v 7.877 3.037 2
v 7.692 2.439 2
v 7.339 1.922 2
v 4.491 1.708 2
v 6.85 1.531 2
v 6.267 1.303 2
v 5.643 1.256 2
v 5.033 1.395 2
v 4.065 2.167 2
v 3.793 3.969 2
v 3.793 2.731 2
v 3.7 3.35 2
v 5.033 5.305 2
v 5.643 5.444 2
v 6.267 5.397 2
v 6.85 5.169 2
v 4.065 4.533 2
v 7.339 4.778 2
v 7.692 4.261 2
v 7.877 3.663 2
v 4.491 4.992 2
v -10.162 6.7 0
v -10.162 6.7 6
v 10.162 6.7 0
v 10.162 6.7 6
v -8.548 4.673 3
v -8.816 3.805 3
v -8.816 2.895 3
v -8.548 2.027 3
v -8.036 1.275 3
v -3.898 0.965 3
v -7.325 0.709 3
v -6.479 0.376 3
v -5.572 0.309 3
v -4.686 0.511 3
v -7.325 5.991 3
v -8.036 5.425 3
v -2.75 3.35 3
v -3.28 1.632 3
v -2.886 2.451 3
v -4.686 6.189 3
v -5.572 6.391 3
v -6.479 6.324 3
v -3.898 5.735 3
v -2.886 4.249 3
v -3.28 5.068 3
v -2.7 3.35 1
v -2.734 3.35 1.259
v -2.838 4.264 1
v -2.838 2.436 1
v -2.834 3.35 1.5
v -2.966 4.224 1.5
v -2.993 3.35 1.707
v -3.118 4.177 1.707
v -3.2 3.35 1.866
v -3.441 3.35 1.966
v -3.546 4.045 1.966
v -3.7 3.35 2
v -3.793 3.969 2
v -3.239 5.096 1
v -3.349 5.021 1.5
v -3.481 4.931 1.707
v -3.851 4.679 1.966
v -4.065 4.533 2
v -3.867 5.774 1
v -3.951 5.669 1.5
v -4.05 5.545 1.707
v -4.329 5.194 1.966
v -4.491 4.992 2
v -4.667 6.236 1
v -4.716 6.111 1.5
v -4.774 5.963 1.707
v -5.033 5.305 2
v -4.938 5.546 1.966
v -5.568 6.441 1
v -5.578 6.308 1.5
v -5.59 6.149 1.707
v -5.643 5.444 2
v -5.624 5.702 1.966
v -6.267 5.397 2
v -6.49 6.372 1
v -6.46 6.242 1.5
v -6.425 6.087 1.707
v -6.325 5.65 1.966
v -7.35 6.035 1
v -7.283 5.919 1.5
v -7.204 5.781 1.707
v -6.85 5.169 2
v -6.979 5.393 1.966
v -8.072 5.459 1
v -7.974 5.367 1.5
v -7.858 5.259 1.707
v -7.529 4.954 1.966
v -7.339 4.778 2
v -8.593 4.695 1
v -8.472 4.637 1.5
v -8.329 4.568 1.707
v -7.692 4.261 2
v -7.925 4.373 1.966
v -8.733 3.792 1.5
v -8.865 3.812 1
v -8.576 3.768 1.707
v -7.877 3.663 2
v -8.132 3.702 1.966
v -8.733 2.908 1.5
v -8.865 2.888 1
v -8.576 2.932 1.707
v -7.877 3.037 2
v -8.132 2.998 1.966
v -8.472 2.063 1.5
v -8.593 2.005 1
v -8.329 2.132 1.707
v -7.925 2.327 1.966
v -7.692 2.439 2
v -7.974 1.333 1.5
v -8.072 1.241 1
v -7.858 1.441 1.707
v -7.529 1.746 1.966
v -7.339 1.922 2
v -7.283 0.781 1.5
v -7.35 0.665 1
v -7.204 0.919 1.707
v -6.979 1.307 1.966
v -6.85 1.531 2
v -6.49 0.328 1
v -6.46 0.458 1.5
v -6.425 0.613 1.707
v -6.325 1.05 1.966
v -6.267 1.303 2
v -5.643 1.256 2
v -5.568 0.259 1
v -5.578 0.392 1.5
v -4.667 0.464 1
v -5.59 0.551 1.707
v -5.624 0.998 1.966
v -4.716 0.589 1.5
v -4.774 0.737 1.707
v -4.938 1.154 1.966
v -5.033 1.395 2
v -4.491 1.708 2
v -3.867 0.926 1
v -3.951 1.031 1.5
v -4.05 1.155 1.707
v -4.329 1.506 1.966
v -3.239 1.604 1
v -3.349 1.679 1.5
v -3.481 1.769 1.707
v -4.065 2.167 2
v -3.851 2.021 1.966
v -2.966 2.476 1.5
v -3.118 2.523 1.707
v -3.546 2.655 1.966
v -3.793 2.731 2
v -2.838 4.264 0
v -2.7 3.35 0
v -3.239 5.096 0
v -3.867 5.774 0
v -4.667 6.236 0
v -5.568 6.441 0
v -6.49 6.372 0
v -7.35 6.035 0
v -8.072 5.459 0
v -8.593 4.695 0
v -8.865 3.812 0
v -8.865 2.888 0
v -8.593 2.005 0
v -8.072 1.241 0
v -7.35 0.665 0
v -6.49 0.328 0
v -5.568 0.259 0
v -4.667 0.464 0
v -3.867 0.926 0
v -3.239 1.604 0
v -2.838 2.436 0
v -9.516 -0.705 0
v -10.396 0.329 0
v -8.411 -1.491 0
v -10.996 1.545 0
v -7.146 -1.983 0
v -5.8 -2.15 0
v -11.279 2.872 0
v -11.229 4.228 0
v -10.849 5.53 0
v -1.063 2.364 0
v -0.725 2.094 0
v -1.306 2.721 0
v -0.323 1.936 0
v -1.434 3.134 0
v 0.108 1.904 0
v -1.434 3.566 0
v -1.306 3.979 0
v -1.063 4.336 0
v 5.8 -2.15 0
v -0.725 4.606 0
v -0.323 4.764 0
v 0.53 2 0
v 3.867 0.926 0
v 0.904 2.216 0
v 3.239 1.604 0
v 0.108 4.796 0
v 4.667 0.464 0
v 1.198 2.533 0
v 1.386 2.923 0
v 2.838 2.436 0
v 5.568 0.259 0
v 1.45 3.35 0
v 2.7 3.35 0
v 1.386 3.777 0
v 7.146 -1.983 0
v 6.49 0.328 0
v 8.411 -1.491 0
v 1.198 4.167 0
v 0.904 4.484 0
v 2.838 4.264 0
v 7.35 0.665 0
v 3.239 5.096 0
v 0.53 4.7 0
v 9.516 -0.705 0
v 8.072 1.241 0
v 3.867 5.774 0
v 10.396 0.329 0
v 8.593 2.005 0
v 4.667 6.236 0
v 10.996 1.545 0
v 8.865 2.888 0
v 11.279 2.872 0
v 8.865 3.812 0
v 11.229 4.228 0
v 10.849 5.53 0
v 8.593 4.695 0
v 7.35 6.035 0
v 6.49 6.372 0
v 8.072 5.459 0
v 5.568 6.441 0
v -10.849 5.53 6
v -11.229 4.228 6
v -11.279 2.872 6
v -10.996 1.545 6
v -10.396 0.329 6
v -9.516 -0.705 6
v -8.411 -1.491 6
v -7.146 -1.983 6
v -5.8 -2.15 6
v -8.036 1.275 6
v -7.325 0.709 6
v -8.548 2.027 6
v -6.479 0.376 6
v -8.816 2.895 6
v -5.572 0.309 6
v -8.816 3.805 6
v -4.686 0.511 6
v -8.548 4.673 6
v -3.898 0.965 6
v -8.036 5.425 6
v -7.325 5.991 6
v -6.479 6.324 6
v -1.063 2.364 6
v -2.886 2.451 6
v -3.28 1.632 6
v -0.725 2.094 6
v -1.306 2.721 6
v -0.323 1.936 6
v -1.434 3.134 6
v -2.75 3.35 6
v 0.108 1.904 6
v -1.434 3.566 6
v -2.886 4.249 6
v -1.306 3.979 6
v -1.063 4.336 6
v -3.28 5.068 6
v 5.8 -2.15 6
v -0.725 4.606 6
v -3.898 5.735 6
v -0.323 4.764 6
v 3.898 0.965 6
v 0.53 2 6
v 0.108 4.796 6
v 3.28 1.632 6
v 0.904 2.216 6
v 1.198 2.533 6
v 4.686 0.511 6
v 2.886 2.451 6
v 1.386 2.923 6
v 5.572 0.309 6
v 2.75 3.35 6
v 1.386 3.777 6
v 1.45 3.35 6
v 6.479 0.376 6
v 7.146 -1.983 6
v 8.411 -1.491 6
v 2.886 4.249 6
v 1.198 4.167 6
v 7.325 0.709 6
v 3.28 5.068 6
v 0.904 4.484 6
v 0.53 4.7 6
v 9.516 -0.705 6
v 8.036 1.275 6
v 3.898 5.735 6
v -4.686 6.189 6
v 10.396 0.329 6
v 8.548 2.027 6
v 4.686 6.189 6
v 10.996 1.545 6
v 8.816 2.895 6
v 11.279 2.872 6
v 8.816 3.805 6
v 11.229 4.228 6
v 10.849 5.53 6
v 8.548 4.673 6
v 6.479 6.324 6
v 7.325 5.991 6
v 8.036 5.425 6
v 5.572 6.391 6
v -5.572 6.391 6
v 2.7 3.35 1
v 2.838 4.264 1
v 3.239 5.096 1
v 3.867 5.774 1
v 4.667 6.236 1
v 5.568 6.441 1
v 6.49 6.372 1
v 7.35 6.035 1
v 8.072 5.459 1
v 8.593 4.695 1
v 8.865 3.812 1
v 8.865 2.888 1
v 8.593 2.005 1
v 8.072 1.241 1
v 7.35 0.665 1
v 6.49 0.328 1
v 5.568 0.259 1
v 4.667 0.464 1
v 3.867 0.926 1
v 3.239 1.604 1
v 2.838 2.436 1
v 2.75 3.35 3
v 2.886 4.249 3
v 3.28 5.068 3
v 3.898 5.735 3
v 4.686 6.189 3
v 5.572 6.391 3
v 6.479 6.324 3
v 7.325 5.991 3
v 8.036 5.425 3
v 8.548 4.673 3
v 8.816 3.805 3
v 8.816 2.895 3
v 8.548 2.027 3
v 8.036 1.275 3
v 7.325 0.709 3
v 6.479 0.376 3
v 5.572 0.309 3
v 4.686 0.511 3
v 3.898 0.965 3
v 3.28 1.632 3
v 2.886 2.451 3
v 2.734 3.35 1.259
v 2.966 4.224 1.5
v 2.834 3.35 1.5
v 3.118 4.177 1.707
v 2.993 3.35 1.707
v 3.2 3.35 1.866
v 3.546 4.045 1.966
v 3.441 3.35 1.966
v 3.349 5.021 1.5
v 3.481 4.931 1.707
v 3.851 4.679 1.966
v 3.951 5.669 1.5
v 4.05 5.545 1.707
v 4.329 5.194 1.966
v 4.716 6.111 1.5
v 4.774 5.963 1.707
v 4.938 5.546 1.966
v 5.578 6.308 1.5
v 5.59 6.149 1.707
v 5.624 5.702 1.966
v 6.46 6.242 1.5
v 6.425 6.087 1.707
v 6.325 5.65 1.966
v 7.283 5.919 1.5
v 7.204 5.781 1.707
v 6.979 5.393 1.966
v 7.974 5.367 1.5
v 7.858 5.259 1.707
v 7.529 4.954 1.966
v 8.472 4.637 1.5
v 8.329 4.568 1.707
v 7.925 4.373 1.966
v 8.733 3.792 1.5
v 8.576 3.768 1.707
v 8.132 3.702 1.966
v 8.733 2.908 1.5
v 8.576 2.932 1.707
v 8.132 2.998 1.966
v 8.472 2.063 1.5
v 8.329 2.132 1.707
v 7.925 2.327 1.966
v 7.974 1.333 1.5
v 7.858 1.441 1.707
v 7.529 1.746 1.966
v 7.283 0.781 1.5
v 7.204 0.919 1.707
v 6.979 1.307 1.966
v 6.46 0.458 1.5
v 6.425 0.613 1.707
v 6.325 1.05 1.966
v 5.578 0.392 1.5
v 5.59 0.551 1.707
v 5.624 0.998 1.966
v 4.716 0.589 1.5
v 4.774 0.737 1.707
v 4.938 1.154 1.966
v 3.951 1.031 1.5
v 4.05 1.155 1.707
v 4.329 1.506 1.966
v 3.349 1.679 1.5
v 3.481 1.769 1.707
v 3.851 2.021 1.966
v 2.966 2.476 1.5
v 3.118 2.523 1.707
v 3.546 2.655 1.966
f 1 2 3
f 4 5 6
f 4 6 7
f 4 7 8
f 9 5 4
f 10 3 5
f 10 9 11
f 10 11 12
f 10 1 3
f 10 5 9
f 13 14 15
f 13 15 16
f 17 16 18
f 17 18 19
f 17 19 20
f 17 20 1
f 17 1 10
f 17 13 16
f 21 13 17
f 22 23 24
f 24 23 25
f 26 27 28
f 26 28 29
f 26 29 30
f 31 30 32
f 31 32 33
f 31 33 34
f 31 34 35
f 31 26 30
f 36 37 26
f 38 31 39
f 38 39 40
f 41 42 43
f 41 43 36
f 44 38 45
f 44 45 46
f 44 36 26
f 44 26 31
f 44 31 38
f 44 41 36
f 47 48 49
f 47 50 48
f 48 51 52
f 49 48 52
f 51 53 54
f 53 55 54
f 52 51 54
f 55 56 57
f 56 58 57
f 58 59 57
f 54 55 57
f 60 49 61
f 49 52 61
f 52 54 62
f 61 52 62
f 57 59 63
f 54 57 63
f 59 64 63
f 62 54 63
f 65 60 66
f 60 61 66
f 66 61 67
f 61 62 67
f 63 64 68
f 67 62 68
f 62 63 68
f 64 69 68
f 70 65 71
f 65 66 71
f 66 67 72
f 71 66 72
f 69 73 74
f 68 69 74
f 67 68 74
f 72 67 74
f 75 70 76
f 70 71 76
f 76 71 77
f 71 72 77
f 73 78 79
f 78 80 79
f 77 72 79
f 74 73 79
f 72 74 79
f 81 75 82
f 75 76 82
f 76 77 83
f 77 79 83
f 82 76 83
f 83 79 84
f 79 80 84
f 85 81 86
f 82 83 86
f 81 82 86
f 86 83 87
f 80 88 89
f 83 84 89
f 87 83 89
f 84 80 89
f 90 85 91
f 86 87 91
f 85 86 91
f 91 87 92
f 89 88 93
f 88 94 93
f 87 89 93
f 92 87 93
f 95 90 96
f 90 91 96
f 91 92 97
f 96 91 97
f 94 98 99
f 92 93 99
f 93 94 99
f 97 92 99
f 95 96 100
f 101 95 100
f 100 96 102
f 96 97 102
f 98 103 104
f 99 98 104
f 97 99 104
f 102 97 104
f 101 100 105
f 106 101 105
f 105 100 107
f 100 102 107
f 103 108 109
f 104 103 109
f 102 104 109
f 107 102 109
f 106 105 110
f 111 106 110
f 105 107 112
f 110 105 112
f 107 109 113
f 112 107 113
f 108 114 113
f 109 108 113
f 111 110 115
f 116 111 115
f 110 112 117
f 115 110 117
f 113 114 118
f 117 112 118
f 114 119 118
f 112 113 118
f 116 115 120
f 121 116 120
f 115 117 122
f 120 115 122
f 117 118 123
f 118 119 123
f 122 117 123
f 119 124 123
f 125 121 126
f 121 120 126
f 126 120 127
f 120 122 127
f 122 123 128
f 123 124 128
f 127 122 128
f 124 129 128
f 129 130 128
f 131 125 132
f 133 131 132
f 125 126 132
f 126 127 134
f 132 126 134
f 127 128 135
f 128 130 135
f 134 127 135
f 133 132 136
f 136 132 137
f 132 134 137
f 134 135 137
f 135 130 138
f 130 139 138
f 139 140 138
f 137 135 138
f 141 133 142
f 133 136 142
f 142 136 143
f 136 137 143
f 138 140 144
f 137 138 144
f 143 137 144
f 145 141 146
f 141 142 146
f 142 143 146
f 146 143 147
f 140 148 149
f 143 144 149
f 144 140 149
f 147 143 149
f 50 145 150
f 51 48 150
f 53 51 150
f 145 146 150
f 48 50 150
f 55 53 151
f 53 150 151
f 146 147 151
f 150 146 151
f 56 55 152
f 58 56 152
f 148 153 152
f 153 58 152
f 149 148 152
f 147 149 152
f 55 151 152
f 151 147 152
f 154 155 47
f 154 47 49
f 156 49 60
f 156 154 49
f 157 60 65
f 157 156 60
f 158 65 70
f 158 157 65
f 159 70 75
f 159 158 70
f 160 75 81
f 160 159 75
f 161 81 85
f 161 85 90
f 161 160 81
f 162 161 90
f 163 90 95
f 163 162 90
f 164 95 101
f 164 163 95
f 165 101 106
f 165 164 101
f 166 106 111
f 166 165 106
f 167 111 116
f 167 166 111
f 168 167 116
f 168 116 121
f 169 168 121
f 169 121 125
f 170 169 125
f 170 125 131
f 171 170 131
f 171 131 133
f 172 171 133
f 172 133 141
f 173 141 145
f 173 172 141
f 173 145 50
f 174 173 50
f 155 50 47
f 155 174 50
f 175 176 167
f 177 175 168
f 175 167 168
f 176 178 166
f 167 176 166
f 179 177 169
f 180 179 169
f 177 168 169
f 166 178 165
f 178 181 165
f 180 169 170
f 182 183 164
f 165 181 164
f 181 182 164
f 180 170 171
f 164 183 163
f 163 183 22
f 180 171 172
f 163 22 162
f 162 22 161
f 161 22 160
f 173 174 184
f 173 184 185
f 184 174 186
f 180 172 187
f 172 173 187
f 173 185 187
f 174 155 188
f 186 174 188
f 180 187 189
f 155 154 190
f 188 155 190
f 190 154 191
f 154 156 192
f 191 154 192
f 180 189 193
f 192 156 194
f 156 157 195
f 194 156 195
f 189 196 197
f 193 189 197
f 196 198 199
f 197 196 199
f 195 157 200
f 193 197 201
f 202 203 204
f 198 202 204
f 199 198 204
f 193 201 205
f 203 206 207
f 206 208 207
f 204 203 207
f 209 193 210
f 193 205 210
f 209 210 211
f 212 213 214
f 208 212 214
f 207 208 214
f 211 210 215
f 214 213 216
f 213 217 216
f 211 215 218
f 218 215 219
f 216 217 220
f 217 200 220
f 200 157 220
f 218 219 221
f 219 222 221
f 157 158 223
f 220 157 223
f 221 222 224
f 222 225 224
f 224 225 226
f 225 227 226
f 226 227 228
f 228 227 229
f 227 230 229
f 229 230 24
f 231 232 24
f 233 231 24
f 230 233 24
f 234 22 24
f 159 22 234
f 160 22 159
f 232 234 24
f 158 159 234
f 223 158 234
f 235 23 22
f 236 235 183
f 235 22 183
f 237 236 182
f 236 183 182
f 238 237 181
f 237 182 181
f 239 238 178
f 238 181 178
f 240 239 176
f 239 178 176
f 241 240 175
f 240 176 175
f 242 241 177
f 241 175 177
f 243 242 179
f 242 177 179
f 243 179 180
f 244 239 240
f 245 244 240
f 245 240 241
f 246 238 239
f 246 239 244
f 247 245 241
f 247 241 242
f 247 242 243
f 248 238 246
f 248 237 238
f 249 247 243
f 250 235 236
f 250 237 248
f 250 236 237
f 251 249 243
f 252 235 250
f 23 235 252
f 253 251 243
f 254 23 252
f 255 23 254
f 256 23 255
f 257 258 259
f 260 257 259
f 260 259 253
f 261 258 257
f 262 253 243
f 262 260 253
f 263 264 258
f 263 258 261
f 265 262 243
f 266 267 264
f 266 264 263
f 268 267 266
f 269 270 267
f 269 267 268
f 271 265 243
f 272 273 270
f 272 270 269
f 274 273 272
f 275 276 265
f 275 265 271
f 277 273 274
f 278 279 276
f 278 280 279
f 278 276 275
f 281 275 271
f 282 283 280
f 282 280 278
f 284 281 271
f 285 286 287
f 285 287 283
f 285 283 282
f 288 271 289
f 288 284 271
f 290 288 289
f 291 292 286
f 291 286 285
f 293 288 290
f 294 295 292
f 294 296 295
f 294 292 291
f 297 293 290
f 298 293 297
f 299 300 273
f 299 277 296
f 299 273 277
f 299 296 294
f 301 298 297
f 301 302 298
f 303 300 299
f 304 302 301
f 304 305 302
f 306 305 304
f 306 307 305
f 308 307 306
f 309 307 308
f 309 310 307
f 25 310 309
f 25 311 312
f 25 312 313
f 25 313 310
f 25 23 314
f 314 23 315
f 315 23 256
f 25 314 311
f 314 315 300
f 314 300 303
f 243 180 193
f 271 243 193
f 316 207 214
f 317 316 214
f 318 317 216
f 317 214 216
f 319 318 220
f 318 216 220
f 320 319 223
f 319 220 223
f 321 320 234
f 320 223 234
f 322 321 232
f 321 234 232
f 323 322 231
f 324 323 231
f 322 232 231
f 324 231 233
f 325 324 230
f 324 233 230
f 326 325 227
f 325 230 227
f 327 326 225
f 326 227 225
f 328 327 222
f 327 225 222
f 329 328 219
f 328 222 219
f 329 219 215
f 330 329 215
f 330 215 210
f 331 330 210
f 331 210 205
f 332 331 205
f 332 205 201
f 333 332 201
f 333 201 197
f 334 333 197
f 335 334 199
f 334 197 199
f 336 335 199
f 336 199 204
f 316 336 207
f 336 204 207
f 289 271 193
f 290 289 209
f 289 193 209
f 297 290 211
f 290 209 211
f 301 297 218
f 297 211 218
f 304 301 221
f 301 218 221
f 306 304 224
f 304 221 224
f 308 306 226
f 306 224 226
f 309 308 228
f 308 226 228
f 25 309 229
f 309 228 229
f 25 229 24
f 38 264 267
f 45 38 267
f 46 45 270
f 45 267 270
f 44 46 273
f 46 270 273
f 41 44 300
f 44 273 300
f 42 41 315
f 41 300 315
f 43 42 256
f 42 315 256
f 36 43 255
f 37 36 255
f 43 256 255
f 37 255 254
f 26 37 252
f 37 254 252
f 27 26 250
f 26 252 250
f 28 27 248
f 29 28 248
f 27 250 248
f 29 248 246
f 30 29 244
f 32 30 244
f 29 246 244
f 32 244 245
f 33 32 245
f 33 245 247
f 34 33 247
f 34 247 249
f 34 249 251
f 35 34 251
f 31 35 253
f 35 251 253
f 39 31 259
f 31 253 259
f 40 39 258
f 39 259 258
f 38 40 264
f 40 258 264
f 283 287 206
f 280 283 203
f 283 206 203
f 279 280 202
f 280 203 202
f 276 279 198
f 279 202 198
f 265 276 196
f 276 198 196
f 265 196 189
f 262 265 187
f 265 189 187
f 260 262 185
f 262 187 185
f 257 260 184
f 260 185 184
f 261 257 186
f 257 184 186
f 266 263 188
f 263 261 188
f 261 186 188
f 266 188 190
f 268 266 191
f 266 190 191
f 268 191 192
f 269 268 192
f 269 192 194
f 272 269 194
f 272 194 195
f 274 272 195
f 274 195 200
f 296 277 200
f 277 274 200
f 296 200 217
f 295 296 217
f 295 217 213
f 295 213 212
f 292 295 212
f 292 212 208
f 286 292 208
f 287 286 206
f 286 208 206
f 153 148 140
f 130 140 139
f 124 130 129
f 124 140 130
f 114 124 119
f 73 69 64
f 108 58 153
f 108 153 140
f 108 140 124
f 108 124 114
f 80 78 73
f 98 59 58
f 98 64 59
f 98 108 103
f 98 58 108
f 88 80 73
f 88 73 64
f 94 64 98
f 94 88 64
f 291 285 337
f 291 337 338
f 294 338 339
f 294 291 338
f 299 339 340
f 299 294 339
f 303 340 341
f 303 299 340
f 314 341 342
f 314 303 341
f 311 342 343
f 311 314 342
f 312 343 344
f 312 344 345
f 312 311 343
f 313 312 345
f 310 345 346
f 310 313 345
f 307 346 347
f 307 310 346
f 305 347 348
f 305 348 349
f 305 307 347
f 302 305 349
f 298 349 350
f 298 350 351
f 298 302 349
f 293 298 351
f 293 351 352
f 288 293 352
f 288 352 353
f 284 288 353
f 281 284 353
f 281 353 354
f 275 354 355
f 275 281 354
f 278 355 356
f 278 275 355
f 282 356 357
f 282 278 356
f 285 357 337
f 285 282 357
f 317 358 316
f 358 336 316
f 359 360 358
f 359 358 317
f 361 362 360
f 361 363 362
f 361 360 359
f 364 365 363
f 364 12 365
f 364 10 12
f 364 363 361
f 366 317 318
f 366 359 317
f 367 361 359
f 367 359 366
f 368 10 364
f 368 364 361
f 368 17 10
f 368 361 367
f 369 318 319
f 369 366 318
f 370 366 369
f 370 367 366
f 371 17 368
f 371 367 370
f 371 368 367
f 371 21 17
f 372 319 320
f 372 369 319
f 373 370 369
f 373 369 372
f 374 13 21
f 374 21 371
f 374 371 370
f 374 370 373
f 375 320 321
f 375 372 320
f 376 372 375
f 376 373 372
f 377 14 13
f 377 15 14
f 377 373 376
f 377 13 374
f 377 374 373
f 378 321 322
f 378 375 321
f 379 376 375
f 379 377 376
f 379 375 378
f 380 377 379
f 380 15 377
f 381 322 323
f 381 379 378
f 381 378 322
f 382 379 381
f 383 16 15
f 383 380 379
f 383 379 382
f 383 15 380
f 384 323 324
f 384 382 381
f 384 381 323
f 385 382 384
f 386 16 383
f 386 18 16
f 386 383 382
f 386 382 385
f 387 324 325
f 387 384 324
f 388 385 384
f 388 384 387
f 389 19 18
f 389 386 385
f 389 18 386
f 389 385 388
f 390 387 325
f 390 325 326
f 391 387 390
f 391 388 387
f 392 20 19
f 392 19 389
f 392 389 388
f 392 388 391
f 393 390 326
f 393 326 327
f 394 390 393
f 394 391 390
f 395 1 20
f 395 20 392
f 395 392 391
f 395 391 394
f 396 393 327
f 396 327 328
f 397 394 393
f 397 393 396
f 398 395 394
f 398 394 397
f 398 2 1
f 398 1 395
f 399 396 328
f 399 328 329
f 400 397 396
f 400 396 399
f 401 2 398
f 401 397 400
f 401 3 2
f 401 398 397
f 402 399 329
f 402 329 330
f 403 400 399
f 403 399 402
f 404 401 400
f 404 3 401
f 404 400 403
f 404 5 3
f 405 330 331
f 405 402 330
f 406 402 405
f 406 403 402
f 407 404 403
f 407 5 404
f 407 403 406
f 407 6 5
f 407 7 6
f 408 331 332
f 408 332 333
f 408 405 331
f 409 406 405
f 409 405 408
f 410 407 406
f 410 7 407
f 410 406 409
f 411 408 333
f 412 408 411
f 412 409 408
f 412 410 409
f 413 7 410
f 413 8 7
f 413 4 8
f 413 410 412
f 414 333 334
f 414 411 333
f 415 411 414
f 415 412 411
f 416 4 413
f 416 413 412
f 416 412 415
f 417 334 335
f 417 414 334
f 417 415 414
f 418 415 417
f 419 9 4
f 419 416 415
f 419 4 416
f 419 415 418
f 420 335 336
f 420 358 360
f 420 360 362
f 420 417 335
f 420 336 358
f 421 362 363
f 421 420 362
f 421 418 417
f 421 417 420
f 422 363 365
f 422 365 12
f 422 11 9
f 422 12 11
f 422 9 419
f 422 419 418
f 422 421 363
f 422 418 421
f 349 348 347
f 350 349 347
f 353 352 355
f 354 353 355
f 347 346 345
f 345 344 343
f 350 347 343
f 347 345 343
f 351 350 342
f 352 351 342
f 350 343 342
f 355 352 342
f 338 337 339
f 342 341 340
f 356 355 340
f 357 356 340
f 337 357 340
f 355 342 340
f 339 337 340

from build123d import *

# Parameters (mm, degrees)
SKETCH1_R           = 3.5
SKETCH1_R_2         = 3.1
EXTRUDE_THIN1_DEPTH = 2
BOSS_EXTRUDE1_DEPTH = 4
SKETCH3_R           = 3.05
CUT_EXTRUDE1_DEPTH  = 3
CUT_EXTRUDE2_REACH  = 15.016
SKETCH4_R           = 1.45
BOSS_EXTRUDE2_START = 2
SKETCH5_R           = 1.45
BOSS_EXTRUDE2_DEPTH = 2
FILLET1_R           = 1
EXTRUDE_THIN2_START = -6
EXTRUDE_THIN2_DEPTH = 6
CUT_EXTRUDE3_REACH  = 17.557


with BuildPart() as part:
    # Sketch1 → Extrude-Thin1 (new body)
    with BuildSketch(Plane.XY):
        with Locations((-5.8, 3.35)):
            Circle(SKETCH1_R)
        with Locations((-5.8, 3.35)):
            Circle(SKETCH1_R_2, mode=Mode.SUBTRACT)
    extrude(amount=EXTRUDE_THIN1_DEPTH)


with BuildPart() as body_2:
    # Mirror3: mirrored copy
    add(part.part.mirror(Plane(origin=(0, 0, 0), x_dir=(0, 0, 1), z_dir=(1, 0, 0))))


with BuildPart() as part_1:
    add(part.part)

    add(body_2.part)  # Boss-Extrude1 merges body 2
    # Sketch2 → Boss-Extrude1 (add)
    with BuildSketch(Plane.XY.offset(2)):
        with BuildLine():
            Line((-5.8, 6.85), (5.8, 6.85))
            ThreePointArc((5.8, 6.85), (9.3, 3.35), (5.8, -0.15))
            Line((5.8, -0.15), (-5.8, -0.15))
            ThreePointArc((-5.8, -0.15), (-9.3, 3.35), (-5.8, 6.85))
        make_face()
    extrude(amount=BOSS_EXTRUDE1_DEPTH)

    # Sketch3 → Cut-Extrude1 (cut)
    with BuildSketch(Plane.XY.offset(6)):
        with Locations((-5.8, 3.35)):
            Circle(SKETCH3_R)
    cut_extrude1 = extrude(amount=-CUT_EXTRUDE1_DEPTH, mode=Mode.SUBTRACT)

    # Mirror4: Cut-Extrude1 across plane
    add(cut_extrude1.mirror(Plane(origin=(0, 0, 0), x_dir=(0, 0, 1), z_dir=(1, 0, 0))), mode=Mode.SUBTRACT)

    # Sketch4 → Cut-Extrude2 (cut, up to next)
    with BuildSketch(Plane.XY.offset(6), mode=Mode.PRIVATE) as cut_extrude2_sk1:
        with Locations((0, 3.35)):
            Circle(SKETCH4_R)
    cut_extrude2_tool1 = extrude(cut_extrude2_sk1.sketch, amount=-CUT_EXTRUDE2_REACH, mode=Mode.PRIVATE) & part_1.part
    add(cut_extrude2_tool1.solids().sort_by_distance((0, 3.35, 6))[0], mode=Mode.SUBTRACT)

    # Sketch5 → Boss-Extrude2 (add)
    with BuildSketch(Plane(origin=(0, 0, 2), x_dir=(-1, 0, 0), z_dir=(0, 0, -1)).offset(BOSS_EXTRUDE2_START)):
        with BuildLine():
            Line((-5.8, -0.15), (5.8, -0.15))
            ThreePointArc((5.8, -0.15), (2.3, 3.35), (5.8, 6.85))
            Line((5.8, 6.85), (-5.8, 6.85))
            ThreePointArc((-5.8, 6.85), (-2.3, 3.35), (-5.8, -0.15))
        make_face()
        with Locations(Location((0, 3.35, 0), (0, 0, 180))):
            Circle(SKETCH5_R, mode=Mode.SUBTRACT)
    extrude(amount=-BOSS_EXTRUDE2_DEPTH)

    # Fillet1
    fillet1_edges = [part_1.edges().sort_by_distance(p)[0] for p in [
        (-8.9, 3.35, 2),
        (8.9, 3.35, 2),
    ]]
    fillet(fillet1_edges, radius=FILLET1_R)

    # Sketch6 → Extrude-Thin2 (add)
    with BuildSketch(Plane.XY.offset(6).offset(EXTRUDE_THIN2_START)):
        with BuildLine():
            Line((5.8, 8.85), (-5.8, 8.85))
            ThreePointArc((-5.8, 8.85), (-11.3, 3.35), (-5.8, -2.15))
            Line((-5.8, -2.15), (5.8, -2.15))
            ThreePointArc((5.8, -2.15), (11.3, 3.35), (5.8, 8.85))
        make_face()
        with BuildLine():
            Line((5.8, 6.85), (-5.8, 6.85))
            ThreePointArc((-5.8, 6.85), (-9.3, 3.35), (-5.8, -0.15))
            Line((-5.8, -0.15), (5.8, -0.15))
            ThreePointArc((5.8, -0.15), (9.3, 3.35), (5.8, 6.85))
        make_face(mode=Mode.SUBTRACT)
    extrude(amount=EXTRUDE_THIN2_DEPTH)

    # Sketch7 → Cut-Extrude3 (cut, up to next)
    with BuildSketch(Plane.XY.offset(6), mode=Mode.PRIVATE) as cut_extrude3_sk1:
        with BuildLine():
            Line((-10.162052269, 6.7), (10.162052269, 6.7))
            ThreePointArc((10.162052269, 6.7), (8.231563283, 8.28330518), (5.8, 8.85))
            Line((5.8, 8.85), (-5.8, 8.85))
            ThreePointArc((-5.8, 8.85), (-8.231563283, 8.28330518), (-10.162052269, 6.7))
        make_face()
    cut_extrude3_tool1 = extrude(cut_extrude3_sk1.sketch, amount=-CUT_EXTRUDE3_REACH, mode=Mode.PRIVATE) & part_1.part
    add(cut_extrude3_tool1.solids().sort_by_distance((0, 7.706585, 6))[0], mode=Mode.SUBTRACT)


solid = part_1.part
